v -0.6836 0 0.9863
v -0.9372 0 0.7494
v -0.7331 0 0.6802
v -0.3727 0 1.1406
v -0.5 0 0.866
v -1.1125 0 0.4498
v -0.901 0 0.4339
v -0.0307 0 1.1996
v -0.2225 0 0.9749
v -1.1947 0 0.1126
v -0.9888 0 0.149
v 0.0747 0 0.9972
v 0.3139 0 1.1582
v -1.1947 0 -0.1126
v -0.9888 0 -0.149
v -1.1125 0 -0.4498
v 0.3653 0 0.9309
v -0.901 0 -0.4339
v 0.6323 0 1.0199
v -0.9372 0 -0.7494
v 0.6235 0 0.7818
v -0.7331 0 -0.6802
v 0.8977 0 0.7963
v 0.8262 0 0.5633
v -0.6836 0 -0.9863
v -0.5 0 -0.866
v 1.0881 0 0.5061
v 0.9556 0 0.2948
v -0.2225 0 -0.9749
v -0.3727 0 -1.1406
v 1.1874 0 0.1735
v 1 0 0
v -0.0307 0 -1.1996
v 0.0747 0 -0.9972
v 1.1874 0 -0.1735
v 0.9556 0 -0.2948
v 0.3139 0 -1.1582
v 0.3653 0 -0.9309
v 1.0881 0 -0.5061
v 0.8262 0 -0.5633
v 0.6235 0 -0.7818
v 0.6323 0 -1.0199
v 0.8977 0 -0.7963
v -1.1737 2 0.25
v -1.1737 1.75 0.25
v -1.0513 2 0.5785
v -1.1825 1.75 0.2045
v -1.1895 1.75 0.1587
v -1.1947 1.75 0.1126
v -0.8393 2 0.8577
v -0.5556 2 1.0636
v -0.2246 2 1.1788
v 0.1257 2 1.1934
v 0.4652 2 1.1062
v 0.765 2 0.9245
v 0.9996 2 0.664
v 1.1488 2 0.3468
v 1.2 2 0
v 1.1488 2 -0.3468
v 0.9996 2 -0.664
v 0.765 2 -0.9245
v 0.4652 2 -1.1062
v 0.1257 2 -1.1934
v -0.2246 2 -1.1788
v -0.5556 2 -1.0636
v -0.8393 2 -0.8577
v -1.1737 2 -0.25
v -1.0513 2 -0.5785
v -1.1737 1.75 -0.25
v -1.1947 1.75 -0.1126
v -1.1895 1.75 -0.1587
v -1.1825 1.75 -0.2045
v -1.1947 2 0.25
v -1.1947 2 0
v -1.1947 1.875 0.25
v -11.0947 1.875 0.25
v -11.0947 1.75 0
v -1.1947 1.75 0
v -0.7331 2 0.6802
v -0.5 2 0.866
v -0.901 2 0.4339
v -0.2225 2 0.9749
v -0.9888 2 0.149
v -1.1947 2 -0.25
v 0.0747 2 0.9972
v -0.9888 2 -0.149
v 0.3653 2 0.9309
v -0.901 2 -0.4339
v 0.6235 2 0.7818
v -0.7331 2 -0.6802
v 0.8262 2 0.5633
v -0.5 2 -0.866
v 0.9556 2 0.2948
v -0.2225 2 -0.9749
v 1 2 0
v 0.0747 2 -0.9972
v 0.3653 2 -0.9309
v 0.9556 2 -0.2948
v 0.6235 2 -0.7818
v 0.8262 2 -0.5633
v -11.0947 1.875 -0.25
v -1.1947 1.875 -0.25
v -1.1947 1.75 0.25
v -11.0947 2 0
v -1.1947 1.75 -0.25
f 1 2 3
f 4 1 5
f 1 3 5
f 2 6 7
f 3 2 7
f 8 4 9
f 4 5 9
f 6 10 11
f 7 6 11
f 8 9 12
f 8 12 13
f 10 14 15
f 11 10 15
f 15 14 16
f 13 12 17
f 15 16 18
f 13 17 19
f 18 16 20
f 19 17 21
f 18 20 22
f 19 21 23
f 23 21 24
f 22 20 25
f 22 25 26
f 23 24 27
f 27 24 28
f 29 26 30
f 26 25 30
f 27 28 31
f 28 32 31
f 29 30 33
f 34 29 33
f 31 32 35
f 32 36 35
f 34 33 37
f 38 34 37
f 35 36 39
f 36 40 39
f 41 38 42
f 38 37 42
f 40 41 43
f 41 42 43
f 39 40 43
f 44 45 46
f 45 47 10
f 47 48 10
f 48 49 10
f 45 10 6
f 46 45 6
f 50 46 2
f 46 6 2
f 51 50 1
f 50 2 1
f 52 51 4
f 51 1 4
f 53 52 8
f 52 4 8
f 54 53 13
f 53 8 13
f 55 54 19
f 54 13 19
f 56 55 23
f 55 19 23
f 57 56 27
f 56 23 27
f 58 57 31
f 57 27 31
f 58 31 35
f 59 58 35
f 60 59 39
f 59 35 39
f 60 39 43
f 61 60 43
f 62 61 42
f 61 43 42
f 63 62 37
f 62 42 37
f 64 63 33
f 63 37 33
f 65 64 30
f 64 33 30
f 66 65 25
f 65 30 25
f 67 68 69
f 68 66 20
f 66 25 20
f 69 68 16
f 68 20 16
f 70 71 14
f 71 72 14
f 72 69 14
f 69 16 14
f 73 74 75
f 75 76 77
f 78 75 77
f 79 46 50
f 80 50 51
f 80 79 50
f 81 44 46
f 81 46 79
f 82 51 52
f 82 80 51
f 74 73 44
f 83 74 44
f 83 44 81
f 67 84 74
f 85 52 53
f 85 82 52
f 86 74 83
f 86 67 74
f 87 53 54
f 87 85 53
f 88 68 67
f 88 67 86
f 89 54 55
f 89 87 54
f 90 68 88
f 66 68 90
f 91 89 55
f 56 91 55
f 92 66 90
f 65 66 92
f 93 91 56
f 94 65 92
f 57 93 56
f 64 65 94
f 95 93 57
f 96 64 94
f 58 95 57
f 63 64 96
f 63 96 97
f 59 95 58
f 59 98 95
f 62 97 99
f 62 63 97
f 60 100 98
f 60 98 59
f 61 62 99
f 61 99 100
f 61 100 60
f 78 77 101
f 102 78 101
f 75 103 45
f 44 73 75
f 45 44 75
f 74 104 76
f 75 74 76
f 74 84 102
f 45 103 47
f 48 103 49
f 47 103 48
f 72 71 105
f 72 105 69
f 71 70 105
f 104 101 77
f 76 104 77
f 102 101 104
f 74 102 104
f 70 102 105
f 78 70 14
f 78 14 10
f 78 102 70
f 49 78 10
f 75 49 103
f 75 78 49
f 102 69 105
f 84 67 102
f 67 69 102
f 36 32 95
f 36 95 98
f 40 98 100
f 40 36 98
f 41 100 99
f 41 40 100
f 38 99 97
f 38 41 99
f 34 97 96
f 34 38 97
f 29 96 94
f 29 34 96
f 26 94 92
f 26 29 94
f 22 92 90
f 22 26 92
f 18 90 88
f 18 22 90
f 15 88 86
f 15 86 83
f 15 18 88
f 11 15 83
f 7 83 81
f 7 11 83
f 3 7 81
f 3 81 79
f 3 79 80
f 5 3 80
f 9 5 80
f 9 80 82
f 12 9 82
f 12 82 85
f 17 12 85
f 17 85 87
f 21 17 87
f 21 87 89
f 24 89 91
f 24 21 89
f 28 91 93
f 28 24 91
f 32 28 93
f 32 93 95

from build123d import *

# Parameters (mm, degrees)
SKETCH1_R           = 1.2
SKETCH1_R_2         = 1
BOSS_EXTRUDE1_DEPTH = 2
BOSS_EXTRUDE3_DEPTH = 0.25
SKETCH3_OUTSIDE_W   = 6.938
SKETCH3_OUTSIDE_H   = 6.538
CUT_EXTRUDE3_DEPTH  = 9.9


with BuildPart() as part:
    # Sketch1 → Boss-Extrude1 (new body)
    with BuildSketch(Plane(origin=(0, 0, 0), x_dir=(1, 0, 0), z_dir=(0, 1, 0))):
        Circle(SKETCH1_R)
        Circle(SKETCH1_R_2, mode=Mode.SUBTRACT)
    extrude(amount=BOSS_EXTRUDE1_DEPTH)

    # Sketch2 → Boss-Extrude3 (add)
    with BuildSketch(Plane(origin=(0, 2, 0), x_dir=(1, 0, 0), z_dir=(0, 1, 0))):
        with BuildLine():
            Line((-11.094706331, -0.25), (-1.173669459, -0.25))
            ThreePointArc((-1.173669459, -0.25), (-1.2, 0), (-1.173669459, 0.25))
            Line((-1.173669459, 0.25), (-11.094706331, 0.25))
            Line((-11.094706331, 0.25), (-11.094706331, -0.25))
        make_face()
    extrude(amount=-BOSS_EXTRUDE3_DEPTH)

    # Sketch3 outside → Cut-Extrude3 (cut)
    with BuildSketch(Plane.ZY.offset(11.094706331)):
        with Locations((0, 1)):
            Rectangle(SKETCH3_OUTSIDE_W, SKETCH3_OUTSIDE_H)
        Polygon((-0.25, 1.875), (0, 2), (0.25, 1.875), (0, 1.75), align=None, mode=Mode.SUBTRACT)
    extrude(amount=-CUT_EXTRUDE3_DEPTH, mode=Mode.SUBTRACT)


solid = part.part
